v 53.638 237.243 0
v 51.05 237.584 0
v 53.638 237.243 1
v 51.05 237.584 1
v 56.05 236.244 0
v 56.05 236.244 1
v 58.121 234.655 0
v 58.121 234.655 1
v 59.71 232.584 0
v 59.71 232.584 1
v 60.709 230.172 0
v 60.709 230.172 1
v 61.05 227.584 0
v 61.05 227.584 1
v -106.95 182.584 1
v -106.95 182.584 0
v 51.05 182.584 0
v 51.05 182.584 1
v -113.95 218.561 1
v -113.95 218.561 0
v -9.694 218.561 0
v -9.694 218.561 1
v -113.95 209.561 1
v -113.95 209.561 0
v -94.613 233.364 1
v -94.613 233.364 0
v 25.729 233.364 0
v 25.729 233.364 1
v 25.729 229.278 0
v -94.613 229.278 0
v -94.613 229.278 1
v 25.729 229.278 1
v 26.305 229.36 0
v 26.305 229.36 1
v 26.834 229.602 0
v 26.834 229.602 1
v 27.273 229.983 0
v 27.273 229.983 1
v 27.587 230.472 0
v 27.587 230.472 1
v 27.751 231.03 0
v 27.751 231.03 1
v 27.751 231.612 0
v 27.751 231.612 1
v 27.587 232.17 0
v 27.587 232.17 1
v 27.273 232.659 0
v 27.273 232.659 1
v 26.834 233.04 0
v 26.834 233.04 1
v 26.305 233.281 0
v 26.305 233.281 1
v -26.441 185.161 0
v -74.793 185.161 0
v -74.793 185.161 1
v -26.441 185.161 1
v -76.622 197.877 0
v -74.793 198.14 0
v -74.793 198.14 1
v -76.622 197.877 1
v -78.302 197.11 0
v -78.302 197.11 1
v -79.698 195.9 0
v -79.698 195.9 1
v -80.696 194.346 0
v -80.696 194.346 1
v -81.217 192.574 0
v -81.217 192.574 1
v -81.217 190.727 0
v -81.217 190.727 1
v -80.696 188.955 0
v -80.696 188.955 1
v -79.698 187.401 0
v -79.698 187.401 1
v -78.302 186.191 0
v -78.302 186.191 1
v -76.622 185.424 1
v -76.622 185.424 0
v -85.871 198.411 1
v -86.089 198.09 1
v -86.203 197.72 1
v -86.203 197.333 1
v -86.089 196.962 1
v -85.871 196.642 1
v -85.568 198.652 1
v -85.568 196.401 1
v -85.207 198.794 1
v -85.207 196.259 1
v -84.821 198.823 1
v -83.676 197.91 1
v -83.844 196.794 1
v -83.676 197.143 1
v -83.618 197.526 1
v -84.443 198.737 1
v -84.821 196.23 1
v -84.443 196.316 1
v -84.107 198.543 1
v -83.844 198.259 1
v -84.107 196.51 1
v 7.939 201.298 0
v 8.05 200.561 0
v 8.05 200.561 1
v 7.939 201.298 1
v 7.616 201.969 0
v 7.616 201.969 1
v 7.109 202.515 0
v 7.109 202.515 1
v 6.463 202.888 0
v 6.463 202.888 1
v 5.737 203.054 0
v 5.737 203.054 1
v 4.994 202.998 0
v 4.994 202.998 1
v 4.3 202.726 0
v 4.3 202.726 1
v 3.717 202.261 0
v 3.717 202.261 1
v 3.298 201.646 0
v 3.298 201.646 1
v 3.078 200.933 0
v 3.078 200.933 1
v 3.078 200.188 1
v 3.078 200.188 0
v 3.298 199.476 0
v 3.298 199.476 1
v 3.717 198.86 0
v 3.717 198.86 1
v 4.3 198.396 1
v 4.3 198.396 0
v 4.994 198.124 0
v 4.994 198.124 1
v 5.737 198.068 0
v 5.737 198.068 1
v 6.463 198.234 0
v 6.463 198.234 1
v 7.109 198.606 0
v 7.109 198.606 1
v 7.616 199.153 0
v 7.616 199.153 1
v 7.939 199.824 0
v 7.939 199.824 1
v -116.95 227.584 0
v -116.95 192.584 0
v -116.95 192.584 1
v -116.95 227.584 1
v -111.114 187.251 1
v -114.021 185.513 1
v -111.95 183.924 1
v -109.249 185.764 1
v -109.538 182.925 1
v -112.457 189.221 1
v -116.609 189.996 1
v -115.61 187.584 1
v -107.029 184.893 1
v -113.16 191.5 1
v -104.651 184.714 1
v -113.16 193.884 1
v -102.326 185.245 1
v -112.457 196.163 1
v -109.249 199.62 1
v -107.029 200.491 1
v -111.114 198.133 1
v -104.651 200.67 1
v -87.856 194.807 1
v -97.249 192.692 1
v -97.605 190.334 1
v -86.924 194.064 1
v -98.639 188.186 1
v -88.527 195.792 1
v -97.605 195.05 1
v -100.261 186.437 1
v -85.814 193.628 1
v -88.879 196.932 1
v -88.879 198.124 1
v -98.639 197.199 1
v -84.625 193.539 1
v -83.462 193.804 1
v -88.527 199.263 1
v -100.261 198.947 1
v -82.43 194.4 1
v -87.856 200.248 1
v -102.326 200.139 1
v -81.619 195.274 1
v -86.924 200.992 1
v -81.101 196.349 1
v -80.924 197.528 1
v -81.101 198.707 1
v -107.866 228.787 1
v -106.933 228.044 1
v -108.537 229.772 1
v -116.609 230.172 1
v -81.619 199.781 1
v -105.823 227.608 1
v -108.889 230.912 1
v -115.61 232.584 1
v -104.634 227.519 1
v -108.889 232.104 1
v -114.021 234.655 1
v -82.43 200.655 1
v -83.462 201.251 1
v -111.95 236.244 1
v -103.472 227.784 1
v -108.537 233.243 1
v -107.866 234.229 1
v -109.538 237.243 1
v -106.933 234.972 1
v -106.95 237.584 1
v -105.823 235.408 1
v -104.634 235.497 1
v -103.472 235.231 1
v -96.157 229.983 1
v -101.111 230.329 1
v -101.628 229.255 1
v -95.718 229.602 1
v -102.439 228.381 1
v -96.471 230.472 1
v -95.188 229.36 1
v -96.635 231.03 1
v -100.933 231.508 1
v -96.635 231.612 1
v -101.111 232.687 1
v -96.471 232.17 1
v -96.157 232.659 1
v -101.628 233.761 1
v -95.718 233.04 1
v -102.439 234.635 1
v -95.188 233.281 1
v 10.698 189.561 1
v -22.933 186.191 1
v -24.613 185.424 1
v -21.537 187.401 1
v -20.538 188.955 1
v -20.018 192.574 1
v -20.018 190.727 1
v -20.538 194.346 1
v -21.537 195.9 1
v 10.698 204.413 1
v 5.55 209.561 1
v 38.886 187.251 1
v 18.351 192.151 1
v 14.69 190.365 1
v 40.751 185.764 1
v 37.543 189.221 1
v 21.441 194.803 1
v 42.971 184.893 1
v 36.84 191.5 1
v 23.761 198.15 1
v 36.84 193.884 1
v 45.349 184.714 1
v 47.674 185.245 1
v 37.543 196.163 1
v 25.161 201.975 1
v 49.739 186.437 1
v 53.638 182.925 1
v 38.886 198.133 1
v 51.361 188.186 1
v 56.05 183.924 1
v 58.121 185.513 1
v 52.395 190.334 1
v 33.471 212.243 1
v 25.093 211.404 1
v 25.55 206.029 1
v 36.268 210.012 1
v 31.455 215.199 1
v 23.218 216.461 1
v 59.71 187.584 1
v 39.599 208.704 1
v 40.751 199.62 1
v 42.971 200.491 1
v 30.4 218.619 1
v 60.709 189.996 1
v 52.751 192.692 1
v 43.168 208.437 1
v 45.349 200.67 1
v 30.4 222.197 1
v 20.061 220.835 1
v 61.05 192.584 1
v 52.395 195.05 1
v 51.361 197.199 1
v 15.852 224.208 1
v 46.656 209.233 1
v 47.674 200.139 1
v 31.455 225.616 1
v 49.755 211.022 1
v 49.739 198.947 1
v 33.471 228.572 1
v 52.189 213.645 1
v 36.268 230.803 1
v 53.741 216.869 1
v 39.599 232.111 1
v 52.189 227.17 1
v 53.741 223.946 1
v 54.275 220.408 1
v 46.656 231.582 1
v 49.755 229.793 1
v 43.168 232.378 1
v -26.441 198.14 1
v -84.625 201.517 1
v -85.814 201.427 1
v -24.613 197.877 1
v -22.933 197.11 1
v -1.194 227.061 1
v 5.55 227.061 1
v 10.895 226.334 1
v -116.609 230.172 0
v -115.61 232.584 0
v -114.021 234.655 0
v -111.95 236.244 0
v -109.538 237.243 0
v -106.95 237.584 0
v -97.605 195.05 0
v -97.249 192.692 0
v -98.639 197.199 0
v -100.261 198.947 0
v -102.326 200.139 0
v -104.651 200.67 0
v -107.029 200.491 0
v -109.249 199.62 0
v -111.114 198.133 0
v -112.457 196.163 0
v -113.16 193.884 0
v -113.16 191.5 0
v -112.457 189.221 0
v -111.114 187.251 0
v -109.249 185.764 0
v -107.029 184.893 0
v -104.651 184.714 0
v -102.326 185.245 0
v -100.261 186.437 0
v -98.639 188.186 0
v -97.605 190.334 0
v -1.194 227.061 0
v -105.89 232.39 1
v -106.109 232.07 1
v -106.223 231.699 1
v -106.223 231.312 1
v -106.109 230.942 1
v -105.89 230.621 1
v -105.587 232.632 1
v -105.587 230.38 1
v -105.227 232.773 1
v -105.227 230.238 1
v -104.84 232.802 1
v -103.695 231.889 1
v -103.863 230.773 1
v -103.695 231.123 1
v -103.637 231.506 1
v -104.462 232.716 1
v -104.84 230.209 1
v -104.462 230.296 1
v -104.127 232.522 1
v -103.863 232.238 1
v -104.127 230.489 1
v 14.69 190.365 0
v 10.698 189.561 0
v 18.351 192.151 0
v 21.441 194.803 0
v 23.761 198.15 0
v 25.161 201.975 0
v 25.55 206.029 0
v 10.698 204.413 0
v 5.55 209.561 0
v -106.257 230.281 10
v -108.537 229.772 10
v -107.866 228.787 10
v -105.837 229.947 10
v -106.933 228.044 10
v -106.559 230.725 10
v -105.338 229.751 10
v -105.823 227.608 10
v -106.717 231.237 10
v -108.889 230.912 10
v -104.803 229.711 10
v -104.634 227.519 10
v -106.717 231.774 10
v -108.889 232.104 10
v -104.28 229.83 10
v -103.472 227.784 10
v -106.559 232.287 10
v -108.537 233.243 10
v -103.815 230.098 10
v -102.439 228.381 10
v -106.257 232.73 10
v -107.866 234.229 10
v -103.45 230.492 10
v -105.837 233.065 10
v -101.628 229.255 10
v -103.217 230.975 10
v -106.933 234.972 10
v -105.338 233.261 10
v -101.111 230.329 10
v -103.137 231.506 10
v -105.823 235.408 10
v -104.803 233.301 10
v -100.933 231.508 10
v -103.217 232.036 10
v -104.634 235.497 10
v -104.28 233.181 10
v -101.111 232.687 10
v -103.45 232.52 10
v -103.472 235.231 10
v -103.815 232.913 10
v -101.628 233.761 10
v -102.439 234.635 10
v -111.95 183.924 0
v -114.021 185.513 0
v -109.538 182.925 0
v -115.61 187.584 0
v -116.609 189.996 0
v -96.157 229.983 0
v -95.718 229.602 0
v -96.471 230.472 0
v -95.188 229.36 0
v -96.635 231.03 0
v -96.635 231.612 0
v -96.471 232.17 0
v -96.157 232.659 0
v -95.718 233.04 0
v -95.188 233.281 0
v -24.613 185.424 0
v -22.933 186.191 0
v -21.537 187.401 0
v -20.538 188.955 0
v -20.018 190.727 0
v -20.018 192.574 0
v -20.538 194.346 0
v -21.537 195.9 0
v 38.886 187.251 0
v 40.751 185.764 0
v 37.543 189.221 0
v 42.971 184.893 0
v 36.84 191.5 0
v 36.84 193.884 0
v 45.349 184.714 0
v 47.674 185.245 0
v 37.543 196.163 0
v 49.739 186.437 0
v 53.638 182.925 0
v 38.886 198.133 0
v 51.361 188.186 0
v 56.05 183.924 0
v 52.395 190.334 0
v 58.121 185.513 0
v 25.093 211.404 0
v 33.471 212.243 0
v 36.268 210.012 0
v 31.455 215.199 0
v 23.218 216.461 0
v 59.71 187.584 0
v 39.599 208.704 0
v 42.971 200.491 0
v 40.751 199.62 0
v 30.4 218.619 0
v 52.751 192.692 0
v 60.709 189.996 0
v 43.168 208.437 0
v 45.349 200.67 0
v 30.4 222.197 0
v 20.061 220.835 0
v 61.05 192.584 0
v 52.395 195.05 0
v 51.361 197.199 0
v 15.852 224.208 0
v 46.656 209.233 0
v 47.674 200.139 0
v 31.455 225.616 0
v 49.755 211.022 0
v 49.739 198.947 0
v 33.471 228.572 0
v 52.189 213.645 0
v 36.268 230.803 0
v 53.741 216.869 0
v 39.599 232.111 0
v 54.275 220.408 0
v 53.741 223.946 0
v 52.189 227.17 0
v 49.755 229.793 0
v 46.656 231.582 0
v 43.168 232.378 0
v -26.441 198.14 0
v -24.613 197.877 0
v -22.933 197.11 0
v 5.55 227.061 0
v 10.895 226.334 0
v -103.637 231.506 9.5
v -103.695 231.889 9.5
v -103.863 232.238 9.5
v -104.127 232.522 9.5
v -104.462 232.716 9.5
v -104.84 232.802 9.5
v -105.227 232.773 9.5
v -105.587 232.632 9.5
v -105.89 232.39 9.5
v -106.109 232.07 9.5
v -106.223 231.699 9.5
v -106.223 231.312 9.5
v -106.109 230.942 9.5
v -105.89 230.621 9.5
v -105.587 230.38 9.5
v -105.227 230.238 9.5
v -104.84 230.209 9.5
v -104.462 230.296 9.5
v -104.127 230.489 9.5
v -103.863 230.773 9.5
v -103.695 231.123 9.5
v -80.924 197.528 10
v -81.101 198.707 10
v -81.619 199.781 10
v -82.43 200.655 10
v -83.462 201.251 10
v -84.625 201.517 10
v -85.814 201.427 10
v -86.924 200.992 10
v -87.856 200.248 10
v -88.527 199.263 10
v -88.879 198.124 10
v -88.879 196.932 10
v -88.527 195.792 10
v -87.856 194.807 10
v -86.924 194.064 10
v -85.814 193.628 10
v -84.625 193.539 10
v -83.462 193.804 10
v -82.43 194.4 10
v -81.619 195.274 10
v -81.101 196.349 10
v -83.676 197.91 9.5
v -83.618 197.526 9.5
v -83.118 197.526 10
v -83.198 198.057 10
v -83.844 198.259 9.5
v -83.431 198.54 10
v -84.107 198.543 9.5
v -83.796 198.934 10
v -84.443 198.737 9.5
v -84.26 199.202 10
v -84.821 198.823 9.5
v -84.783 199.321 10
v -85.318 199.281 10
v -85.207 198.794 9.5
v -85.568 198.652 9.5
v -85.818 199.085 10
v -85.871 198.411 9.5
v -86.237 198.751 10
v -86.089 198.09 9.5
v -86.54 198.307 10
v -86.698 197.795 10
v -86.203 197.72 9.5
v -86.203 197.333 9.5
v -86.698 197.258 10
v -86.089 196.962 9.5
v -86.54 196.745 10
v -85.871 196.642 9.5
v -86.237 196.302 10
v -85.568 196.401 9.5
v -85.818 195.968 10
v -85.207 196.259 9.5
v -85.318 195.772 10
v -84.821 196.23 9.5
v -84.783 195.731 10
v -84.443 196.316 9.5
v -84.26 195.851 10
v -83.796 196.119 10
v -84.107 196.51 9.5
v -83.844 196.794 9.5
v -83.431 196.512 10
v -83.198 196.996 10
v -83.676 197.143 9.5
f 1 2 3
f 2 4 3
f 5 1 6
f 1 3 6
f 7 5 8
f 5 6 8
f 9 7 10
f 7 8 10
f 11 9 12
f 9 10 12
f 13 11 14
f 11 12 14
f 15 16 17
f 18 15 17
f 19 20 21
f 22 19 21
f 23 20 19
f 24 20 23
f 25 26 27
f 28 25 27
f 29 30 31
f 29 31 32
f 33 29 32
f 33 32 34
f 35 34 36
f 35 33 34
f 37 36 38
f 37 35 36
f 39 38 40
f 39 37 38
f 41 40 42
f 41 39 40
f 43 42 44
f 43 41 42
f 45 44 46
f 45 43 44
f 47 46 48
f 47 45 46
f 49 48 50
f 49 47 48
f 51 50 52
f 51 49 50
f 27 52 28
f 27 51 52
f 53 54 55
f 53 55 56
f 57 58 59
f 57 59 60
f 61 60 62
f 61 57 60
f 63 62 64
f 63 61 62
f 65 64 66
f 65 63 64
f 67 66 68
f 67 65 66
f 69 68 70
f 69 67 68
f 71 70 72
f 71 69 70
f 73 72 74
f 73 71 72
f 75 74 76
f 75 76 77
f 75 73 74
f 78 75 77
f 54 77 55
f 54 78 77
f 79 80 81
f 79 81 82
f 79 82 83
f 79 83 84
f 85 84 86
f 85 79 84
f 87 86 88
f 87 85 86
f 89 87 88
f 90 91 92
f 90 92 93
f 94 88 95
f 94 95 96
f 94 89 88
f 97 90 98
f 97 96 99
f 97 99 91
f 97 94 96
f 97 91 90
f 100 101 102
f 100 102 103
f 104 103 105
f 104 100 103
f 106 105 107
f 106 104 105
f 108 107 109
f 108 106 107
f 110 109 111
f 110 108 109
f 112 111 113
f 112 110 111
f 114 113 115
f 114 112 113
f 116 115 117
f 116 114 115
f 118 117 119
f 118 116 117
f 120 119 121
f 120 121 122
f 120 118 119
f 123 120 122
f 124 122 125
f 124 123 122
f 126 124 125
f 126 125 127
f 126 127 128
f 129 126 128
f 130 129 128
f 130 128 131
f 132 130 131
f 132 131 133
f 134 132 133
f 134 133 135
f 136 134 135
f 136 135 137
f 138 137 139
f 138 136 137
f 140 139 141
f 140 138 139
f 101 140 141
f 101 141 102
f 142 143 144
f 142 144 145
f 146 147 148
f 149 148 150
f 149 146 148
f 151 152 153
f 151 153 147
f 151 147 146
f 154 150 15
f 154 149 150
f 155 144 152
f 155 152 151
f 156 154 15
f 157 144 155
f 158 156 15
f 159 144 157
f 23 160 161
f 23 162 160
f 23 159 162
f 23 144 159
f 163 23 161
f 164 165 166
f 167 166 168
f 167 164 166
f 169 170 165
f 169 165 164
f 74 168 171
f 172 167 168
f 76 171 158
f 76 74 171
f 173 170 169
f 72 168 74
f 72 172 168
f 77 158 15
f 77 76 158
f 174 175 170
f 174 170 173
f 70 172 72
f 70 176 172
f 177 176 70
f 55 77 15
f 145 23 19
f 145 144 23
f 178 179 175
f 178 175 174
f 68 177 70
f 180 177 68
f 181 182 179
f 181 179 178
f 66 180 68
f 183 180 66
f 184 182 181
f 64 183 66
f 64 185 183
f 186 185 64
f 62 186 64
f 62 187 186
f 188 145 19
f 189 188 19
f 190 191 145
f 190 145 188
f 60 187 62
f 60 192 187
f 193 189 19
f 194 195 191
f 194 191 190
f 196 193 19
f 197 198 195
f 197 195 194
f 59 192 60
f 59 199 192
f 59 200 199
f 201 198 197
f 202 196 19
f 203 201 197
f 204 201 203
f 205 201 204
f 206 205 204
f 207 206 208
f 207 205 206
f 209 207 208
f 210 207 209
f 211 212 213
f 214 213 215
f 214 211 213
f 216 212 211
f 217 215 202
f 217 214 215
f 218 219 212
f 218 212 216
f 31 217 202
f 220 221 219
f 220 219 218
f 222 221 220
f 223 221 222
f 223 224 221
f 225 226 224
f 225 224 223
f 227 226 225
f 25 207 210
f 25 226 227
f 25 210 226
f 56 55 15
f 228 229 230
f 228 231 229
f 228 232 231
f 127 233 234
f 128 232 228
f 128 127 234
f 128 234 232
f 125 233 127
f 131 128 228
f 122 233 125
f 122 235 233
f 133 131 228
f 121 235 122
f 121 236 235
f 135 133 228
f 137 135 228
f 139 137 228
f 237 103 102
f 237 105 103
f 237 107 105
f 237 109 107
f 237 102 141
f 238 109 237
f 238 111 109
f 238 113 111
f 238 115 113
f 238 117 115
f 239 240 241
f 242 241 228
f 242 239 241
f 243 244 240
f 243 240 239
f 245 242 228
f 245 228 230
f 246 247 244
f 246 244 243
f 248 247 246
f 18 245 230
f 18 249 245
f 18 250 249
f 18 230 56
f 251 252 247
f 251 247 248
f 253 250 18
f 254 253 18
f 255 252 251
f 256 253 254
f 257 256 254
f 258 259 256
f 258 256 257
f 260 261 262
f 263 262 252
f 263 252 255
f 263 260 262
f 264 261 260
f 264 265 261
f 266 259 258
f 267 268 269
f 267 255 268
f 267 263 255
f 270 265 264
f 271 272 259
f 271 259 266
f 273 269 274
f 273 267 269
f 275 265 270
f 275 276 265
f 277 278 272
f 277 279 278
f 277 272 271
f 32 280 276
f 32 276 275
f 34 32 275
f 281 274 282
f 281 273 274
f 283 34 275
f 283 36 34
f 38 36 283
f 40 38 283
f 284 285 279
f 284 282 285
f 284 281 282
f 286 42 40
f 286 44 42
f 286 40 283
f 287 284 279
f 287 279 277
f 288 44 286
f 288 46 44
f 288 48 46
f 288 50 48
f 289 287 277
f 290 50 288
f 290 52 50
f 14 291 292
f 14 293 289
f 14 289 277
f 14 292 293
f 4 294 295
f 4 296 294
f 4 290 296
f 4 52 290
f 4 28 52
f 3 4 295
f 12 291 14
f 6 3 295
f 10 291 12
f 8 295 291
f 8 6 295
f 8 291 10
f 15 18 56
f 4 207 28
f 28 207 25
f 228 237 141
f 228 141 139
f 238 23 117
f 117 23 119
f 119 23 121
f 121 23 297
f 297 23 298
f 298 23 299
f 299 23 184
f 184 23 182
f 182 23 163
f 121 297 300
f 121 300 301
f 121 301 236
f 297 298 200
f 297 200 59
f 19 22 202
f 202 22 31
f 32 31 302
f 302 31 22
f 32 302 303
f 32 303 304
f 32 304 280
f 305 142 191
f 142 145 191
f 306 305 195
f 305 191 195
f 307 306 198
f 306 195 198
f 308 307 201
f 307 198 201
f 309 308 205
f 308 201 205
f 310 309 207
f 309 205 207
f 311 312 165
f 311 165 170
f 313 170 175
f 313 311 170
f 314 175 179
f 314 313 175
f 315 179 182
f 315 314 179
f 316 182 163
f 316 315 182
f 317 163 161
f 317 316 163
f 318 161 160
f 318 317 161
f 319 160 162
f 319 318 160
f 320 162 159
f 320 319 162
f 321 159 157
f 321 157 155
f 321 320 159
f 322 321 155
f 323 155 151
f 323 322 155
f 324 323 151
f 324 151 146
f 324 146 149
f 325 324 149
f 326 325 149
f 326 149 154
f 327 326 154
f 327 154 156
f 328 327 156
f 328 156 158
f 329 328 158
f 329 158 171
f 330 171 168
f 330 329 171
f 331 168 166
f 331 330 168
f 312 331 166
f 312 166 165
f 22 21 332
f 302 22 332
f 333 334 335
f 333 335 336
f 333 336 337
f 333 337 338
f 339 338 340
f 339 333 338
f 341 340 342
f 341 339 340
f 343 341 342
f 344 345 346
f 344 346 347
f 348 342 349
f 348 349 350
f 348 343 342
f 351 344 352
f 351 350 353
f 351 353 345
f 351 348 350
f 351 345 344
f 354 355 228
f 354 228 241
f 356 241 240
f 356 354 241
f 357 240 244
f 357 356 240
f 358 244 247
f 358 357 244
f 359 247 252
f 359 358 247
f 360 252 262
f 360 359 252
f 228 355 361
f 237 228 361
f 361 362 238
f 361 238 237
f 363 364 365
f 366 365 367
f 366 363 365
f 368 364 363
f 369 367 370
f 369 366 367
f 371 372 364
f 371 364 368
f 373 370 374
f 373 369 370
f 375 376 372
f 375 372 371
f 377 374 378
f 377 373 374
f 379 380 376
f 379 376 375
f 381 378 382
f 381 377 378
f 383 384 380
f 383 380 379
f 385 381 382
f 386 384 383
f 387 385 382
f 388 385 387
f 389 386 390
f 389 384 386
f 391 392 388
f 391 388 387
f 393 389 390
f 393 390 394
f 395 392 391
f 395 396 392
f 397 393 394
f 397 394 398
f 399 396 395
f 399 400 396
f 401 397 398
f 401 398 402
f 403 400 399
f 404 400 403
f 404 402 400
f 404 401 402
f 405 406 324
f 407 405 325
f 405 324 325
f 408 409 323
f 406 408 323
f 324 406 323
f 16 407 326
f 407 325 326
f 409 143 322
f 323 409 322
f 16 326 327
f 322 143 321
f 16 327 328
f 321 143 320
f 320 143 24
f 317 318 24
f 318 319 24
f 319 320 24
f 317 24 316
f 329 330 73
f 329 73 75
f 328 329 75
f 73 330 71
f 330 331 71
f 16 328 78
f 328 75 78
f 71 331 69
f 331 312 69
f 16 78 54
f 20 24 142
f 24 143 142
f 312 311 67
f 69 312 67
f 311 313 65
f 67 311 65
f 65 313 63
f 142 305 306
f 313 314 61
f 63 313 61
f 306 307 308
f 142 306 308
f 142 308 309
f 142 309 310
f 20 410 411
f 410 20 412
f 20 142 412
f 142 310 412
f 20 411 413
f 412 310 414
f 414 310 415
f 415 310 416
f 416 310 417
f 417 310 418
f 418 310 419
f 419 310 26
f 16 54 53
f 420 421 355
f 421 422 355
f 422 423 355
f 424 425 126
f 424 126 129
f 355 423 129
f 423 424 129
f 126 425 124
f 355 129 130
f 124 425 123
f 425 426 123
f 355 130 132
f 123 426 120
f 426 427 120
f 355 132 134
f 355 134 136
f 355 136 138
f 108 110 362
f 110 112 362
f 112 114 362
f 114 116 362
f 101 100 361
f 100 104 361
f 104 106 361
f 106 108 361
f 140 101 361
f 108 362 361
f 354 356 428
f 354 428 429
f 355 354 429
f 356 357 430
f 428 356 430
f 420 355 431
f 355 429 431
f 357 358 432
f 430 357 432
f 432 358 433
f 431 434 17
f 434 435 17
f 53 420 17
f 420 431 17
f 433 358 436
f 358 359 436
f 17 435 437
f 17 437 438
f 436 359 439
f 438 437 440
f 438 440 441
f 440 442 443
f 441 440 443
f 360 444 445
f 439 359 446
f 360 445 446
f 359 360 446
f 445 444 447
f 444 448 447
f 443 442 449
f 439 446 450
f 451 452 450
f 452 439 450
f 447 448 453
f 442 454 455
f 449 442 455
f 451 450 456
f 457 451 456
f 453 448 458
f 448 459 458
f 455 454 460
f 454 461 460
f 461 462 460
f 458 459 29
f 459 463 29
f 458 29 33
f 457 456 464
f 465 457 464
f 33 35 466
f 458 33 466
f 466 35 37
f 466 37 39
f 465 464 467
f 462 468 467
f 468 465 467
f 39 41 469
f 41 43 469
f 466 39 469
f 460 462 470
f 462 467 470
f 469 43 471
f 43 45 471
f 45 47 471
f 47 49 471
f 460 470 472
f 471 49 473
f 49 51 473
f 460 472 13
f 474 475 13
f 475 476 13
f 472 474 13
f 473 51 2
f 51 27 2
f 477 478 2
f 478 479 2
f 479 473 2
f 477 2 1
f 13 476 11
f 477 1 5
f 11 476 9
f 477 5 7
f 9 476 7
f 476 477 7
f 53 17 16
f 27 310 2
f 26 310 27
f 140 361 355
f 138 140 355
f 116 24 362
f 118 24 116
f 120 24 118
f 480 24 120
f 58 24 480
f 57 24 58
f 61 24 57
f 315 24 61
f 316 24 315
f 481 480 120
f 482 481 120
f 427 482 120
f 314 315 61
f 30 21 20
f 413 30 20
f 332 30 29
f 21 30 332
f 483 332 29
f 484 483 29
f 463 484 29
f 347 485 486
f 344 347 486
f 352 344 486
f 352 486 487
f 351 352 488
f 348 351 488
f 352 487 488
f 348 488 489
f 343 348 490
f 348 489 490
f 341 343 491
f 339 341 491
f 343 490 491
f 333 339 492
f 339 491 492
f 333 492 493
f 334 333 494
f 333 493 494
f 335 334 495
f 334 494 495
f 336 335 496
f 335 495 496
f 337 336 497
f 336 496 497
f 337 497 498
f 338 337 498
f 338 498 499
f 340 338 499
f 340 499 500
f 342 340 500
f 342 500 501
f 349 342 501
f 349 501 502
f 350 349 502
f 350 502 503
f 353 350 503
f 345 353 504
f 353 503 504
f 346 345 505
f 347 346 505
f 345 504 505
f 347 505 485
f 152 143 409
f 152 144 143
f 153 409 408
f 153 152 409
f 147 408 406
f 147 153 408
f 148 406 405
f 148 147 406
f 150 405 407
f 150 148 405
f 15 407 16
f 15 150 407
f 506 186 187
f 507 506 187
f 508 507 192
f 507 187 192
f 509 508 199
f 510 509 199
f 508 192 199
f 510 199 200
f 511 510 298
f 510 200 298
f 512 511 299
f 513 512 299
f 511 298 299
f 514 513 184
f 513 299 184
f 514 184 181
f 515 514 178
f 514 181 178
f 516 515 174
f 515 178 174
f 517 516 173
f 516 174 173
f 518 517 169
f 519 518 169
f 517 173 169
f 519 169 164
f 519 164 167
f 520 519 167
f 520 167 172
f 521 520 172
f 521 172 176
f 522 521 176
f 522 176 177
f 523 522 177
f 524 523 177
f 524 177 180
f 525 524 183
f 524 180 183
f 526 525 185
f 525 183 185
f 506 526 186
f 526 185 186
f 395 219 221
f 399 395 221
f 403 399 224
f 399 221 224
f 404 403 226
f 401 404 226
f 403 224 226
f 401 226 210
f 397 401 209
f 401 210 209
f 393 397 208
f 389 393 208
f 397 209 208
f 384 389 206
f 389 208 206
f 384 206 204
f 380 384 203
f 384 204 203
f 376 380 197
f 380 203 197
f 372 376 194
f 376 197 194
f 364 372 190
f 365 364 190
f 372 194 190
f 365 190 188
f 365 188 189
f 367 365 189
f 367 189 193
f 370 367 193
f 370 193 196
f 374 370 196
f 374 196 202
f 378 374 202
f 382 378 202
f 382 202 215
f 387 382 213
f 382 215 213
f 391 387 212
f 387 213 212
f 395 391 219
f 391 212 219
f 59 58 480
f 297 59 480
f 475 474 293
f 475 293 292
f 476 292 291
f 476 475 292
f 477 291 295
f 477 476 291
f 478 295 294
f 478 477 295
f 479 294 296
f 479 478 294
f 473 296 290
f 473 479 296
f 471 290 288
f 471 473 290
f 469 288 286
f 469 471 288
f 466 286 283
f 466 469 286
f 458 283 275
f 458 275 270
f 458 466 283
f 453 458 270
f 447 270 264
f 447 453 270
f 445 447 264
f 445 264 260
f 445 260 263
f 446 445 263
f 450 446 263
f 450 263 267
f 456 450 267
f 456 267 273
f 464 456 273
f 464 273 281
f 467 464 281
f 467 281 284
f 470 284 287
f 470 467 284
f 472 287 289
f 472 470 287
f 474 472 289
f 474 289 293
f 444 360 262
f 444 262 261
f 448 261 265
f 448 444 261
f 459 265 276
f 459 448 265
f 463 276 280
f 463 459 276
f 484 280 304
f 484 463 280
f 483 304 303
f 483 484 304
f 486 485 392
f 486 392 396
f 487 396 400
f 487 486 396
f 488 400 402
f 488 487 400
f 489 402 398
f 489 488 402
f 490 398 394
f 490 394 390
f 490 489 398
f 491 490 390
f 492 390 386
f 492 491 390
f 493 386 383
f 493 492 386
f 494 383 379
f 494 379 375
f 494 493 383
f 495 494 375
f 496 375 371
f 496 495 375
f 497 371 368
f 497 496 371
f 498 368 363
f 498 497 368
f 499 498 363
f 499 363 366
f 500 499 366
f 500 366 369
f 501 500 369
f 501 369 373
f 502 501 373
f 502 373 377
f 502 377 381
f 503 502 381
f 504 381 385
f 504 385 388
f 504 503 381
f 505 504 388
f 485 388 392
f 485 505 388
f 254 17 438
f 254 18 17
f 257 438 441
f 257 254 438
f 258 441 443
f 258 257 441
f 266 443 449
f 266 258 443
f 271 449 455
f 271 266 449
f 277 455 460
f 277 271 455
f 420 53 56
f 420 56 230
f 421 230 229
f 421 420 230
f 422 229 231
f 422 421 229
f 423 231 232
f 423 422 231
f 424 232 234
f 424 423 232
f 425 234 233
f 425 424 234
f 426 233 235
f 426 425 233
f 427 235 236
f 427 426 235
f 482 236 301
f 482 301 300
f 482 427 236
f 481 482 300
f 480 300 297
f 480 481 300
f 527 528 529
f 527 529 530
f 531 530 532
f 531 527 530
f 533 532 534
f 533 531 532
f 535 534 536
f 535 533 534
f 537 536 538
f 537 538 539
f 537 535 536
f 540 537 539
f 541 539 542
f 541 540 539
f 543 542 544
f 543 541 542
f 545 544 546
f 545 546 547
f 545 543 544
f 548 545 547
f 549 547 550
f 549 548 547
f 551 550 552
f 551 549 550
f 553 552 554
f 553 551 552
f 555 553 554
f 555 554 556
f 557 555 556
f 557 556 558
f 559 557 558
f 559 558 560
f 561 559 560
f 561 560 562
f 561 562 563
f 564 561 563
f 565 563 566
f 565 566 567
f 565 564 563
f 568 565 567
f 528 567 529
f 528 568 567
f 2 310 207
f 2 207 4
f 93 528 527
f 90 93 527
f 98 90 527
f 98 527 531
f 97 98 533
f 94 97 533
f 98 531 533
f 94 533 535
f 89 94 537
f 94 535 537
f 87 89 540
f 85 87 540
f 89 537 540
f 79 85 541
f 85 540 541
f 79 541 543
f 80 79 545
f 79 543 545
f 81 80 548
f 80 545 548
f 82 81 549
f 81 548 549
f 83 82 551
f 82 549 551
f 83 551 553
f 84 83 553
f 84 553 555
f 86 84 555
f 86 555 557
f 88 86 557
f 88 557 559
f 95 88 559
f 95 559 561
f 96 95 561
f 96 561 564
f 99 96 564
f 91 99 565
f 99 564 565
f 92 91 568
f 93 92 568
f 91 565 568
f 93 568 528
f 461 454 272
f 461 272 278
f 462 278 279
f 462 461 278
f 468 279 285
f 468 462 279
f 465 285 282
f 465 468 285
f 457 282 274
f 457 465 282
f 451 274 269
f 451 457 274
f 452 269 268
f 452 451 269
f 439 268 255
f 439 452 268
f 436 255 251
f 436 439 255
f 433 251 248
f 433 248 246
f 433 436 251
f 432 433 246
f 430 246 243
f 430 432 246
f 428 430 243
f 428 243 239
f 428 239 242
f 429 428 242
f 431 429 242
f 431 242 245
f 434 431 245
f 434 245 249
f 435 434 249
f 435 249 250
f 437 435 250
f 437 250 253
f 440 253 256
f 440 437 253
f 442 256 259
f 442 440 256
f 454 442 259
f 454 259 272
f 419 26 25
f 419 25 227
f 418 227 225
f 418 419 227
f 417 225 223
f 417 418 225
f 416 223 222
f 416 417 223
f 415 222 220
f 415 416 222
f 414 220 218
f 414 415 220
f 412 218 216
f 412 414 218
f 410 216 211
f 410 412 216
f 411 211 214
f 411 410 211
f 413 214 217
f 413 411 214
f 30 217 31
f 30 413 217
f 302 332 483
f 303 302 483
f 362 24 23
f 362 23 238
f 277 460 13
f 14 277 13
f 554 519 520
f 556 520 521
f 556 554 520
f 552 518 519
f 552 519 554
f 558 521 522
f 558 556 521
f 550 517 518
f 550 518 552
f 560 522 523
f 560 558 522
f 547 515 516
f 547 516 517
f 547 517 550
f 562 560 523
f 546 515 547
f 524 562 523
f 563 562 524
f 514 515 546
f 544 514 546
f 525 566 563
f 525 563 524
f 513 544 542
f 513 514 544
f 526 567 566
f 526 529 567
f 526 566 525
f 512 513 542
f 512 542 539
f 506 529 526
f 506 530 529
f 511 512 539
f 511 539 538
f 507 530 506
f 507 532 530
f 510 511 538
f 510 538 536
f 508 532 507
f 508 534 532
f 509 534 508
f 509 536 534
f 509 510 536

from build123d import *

# Parameters (mm, degrees)
SKETCH001_W   = 178
SKETCH001_H   = 55
SKETCH001_R   = 2.5
SKETCH001_R_2 = 8
SKETCH001_R_3 = 12.004096
PAD_DEPTH     = 1
SKETCH003_R   = 4
PAD001_DEPTH  = 9
SKETCH004_R   = 1.3
POCKET_DEPTH  = 9
FILLET_R      = 10
FILLET001_R   = 10
CHAMFER_SIZE  = 0.5


with BuildPart() as part:
    # Sketch001 → Pad (new body)
    with BuildSketch(Plane.XY):
        with Locations((-27.95005, 210.084131)):
            Rectangle(SKETCH001_W, SKETCH001_H)
        with Locations((5.54995, 200.560838)):
            Circle(SKETCH001_R, mode=Mode.SUBTRACT)
        with Locations((-105.249172, 192.692063)):
            Circle(SKETCH001_R_2, mode=Mode.SUBTRACT)
        with Locations((44.750828, 192.692063)):
            Circle(SKETCH001_R_2, mode=Mode.SUBTRACT)
        with Locations((42.270485, 220.407623)):
            Circle(SKETCH001_R_3, mode=Mode.SUBTRACT)
        with BuildLine():
            ThreePointArc((25.54995, 206.028969), (20.061493, 220.835101), (5.54995, 227.060838))
            Line((-1.19441, 227.060838), (5.54995, 227.060838))
            Line((-9.694456, 218.560838), (-1.19441, 227.060838))
            Line((-113.95005, 218.561117), (-9.694456, 218.560838))
            Line((-113.95005, 218.561117), (-113.95005, 209.560838))
            Line((-113.95005, 209.560838), (-9.618024, 209.560838))
            Line((-9.618024, 209.560838), (5.54995, 209.560838))
            Line((5.54995, 209.560838), (10.697892, 204.412896))
            Line((10.697892, 189.560838), (10.697892, 204.412896))
            ThreePointArc((10.697892, 189.560838), (21.441031, 194.803313), (25.54995, 206.028969))
        make_face(mode=Mode.SUBTRACT)
        with BuildLine():
            ThreePointArc((-74.793427, 198.14003), (-81.282837, 191.65062), (-74.793427, 185.16121))
            Line((-74.793427, 185.16121), (-26.440948, 185.16121))
            ThreePointArc((-26.440948, 185.16121), (-19.951538, 191.65062), (-26.440948, 198.14003))
            Line((-74.793427, 198.14003), (-26.440948, 198.14003))
        make_face(mode=Mode.SUBTRACT)
        with BuildLine():
            ThreePointArc((-94.612823, 233.364261), (-96.6561, 231.320984), (-94.612823, 229.277707))
            Line((-94.612823, 229.277707), (25.728859, 229.277707))
            ThreePointArc((25.728859, 229.277707), (27.772136, 231.320984), (25.728859, 233.364261))
            Line((-94.612823, 233.364261), (25.728859, 233.364261))
        make_face(mode=Mode.SUBTRACT)
    extrude(amount=PAD_DEPTH)

    # Sketch003 (on Face28 of Pad) → Pad001 (join)
    with BuildSketch(Plane.XY.offset(1)):
        with Locations((-84.923561, 197.527756)):
            Circle(SKETCH003_R)
        with Locations((-104.933395, 231.507965)):
            Circle(SKETCH003_R)
    extrude(amount=PAD001_DEPTH)

    # Sketch004 (on Face31 of Pad001) → Pocket (cut)
    with BuildSketch(Plane.XY.offset(10)):
        with Locations((-84.917816, 197.526398)):
            Circle(SKETCH004_R)
        with Locations((-104.937256, 231.505722)):
            Circle(SKETCH004_R)
    extrude(amount=-POCKET_DEPTH, mode=Mode.SUBTRACT)

    # Fillet
    fillet_edges = [part.edges().sort_by_distance(p)[0] for p in [
        (-116.95005, 182.584131, 0.5),
        (61.04995, 182.584131, 0.5),
    ]]
    fillet(fillet_edges, radius=FILLET_R)

    # Fillet001
    fillet001_edges = [part.edges().sort_by_distance(p)[0] for p in [
        (61.04995, 237.584131, 0.5),
        (-116.95005, 237.584131, 0.5),
    ]]
    fillet(fillet001_edges, radius=FILLET001_R)

    # Chamfer
    chamfer_edges = [part.edges().sort_by_distance(p)[0] for p in [
        (-106.237256, 231.505722, 10),
        (-86.217816, 197.526398, 10),
    ]]
    chamfer(chamfer_edges, length=CHAMFER_SIZE)


solid = part.part
